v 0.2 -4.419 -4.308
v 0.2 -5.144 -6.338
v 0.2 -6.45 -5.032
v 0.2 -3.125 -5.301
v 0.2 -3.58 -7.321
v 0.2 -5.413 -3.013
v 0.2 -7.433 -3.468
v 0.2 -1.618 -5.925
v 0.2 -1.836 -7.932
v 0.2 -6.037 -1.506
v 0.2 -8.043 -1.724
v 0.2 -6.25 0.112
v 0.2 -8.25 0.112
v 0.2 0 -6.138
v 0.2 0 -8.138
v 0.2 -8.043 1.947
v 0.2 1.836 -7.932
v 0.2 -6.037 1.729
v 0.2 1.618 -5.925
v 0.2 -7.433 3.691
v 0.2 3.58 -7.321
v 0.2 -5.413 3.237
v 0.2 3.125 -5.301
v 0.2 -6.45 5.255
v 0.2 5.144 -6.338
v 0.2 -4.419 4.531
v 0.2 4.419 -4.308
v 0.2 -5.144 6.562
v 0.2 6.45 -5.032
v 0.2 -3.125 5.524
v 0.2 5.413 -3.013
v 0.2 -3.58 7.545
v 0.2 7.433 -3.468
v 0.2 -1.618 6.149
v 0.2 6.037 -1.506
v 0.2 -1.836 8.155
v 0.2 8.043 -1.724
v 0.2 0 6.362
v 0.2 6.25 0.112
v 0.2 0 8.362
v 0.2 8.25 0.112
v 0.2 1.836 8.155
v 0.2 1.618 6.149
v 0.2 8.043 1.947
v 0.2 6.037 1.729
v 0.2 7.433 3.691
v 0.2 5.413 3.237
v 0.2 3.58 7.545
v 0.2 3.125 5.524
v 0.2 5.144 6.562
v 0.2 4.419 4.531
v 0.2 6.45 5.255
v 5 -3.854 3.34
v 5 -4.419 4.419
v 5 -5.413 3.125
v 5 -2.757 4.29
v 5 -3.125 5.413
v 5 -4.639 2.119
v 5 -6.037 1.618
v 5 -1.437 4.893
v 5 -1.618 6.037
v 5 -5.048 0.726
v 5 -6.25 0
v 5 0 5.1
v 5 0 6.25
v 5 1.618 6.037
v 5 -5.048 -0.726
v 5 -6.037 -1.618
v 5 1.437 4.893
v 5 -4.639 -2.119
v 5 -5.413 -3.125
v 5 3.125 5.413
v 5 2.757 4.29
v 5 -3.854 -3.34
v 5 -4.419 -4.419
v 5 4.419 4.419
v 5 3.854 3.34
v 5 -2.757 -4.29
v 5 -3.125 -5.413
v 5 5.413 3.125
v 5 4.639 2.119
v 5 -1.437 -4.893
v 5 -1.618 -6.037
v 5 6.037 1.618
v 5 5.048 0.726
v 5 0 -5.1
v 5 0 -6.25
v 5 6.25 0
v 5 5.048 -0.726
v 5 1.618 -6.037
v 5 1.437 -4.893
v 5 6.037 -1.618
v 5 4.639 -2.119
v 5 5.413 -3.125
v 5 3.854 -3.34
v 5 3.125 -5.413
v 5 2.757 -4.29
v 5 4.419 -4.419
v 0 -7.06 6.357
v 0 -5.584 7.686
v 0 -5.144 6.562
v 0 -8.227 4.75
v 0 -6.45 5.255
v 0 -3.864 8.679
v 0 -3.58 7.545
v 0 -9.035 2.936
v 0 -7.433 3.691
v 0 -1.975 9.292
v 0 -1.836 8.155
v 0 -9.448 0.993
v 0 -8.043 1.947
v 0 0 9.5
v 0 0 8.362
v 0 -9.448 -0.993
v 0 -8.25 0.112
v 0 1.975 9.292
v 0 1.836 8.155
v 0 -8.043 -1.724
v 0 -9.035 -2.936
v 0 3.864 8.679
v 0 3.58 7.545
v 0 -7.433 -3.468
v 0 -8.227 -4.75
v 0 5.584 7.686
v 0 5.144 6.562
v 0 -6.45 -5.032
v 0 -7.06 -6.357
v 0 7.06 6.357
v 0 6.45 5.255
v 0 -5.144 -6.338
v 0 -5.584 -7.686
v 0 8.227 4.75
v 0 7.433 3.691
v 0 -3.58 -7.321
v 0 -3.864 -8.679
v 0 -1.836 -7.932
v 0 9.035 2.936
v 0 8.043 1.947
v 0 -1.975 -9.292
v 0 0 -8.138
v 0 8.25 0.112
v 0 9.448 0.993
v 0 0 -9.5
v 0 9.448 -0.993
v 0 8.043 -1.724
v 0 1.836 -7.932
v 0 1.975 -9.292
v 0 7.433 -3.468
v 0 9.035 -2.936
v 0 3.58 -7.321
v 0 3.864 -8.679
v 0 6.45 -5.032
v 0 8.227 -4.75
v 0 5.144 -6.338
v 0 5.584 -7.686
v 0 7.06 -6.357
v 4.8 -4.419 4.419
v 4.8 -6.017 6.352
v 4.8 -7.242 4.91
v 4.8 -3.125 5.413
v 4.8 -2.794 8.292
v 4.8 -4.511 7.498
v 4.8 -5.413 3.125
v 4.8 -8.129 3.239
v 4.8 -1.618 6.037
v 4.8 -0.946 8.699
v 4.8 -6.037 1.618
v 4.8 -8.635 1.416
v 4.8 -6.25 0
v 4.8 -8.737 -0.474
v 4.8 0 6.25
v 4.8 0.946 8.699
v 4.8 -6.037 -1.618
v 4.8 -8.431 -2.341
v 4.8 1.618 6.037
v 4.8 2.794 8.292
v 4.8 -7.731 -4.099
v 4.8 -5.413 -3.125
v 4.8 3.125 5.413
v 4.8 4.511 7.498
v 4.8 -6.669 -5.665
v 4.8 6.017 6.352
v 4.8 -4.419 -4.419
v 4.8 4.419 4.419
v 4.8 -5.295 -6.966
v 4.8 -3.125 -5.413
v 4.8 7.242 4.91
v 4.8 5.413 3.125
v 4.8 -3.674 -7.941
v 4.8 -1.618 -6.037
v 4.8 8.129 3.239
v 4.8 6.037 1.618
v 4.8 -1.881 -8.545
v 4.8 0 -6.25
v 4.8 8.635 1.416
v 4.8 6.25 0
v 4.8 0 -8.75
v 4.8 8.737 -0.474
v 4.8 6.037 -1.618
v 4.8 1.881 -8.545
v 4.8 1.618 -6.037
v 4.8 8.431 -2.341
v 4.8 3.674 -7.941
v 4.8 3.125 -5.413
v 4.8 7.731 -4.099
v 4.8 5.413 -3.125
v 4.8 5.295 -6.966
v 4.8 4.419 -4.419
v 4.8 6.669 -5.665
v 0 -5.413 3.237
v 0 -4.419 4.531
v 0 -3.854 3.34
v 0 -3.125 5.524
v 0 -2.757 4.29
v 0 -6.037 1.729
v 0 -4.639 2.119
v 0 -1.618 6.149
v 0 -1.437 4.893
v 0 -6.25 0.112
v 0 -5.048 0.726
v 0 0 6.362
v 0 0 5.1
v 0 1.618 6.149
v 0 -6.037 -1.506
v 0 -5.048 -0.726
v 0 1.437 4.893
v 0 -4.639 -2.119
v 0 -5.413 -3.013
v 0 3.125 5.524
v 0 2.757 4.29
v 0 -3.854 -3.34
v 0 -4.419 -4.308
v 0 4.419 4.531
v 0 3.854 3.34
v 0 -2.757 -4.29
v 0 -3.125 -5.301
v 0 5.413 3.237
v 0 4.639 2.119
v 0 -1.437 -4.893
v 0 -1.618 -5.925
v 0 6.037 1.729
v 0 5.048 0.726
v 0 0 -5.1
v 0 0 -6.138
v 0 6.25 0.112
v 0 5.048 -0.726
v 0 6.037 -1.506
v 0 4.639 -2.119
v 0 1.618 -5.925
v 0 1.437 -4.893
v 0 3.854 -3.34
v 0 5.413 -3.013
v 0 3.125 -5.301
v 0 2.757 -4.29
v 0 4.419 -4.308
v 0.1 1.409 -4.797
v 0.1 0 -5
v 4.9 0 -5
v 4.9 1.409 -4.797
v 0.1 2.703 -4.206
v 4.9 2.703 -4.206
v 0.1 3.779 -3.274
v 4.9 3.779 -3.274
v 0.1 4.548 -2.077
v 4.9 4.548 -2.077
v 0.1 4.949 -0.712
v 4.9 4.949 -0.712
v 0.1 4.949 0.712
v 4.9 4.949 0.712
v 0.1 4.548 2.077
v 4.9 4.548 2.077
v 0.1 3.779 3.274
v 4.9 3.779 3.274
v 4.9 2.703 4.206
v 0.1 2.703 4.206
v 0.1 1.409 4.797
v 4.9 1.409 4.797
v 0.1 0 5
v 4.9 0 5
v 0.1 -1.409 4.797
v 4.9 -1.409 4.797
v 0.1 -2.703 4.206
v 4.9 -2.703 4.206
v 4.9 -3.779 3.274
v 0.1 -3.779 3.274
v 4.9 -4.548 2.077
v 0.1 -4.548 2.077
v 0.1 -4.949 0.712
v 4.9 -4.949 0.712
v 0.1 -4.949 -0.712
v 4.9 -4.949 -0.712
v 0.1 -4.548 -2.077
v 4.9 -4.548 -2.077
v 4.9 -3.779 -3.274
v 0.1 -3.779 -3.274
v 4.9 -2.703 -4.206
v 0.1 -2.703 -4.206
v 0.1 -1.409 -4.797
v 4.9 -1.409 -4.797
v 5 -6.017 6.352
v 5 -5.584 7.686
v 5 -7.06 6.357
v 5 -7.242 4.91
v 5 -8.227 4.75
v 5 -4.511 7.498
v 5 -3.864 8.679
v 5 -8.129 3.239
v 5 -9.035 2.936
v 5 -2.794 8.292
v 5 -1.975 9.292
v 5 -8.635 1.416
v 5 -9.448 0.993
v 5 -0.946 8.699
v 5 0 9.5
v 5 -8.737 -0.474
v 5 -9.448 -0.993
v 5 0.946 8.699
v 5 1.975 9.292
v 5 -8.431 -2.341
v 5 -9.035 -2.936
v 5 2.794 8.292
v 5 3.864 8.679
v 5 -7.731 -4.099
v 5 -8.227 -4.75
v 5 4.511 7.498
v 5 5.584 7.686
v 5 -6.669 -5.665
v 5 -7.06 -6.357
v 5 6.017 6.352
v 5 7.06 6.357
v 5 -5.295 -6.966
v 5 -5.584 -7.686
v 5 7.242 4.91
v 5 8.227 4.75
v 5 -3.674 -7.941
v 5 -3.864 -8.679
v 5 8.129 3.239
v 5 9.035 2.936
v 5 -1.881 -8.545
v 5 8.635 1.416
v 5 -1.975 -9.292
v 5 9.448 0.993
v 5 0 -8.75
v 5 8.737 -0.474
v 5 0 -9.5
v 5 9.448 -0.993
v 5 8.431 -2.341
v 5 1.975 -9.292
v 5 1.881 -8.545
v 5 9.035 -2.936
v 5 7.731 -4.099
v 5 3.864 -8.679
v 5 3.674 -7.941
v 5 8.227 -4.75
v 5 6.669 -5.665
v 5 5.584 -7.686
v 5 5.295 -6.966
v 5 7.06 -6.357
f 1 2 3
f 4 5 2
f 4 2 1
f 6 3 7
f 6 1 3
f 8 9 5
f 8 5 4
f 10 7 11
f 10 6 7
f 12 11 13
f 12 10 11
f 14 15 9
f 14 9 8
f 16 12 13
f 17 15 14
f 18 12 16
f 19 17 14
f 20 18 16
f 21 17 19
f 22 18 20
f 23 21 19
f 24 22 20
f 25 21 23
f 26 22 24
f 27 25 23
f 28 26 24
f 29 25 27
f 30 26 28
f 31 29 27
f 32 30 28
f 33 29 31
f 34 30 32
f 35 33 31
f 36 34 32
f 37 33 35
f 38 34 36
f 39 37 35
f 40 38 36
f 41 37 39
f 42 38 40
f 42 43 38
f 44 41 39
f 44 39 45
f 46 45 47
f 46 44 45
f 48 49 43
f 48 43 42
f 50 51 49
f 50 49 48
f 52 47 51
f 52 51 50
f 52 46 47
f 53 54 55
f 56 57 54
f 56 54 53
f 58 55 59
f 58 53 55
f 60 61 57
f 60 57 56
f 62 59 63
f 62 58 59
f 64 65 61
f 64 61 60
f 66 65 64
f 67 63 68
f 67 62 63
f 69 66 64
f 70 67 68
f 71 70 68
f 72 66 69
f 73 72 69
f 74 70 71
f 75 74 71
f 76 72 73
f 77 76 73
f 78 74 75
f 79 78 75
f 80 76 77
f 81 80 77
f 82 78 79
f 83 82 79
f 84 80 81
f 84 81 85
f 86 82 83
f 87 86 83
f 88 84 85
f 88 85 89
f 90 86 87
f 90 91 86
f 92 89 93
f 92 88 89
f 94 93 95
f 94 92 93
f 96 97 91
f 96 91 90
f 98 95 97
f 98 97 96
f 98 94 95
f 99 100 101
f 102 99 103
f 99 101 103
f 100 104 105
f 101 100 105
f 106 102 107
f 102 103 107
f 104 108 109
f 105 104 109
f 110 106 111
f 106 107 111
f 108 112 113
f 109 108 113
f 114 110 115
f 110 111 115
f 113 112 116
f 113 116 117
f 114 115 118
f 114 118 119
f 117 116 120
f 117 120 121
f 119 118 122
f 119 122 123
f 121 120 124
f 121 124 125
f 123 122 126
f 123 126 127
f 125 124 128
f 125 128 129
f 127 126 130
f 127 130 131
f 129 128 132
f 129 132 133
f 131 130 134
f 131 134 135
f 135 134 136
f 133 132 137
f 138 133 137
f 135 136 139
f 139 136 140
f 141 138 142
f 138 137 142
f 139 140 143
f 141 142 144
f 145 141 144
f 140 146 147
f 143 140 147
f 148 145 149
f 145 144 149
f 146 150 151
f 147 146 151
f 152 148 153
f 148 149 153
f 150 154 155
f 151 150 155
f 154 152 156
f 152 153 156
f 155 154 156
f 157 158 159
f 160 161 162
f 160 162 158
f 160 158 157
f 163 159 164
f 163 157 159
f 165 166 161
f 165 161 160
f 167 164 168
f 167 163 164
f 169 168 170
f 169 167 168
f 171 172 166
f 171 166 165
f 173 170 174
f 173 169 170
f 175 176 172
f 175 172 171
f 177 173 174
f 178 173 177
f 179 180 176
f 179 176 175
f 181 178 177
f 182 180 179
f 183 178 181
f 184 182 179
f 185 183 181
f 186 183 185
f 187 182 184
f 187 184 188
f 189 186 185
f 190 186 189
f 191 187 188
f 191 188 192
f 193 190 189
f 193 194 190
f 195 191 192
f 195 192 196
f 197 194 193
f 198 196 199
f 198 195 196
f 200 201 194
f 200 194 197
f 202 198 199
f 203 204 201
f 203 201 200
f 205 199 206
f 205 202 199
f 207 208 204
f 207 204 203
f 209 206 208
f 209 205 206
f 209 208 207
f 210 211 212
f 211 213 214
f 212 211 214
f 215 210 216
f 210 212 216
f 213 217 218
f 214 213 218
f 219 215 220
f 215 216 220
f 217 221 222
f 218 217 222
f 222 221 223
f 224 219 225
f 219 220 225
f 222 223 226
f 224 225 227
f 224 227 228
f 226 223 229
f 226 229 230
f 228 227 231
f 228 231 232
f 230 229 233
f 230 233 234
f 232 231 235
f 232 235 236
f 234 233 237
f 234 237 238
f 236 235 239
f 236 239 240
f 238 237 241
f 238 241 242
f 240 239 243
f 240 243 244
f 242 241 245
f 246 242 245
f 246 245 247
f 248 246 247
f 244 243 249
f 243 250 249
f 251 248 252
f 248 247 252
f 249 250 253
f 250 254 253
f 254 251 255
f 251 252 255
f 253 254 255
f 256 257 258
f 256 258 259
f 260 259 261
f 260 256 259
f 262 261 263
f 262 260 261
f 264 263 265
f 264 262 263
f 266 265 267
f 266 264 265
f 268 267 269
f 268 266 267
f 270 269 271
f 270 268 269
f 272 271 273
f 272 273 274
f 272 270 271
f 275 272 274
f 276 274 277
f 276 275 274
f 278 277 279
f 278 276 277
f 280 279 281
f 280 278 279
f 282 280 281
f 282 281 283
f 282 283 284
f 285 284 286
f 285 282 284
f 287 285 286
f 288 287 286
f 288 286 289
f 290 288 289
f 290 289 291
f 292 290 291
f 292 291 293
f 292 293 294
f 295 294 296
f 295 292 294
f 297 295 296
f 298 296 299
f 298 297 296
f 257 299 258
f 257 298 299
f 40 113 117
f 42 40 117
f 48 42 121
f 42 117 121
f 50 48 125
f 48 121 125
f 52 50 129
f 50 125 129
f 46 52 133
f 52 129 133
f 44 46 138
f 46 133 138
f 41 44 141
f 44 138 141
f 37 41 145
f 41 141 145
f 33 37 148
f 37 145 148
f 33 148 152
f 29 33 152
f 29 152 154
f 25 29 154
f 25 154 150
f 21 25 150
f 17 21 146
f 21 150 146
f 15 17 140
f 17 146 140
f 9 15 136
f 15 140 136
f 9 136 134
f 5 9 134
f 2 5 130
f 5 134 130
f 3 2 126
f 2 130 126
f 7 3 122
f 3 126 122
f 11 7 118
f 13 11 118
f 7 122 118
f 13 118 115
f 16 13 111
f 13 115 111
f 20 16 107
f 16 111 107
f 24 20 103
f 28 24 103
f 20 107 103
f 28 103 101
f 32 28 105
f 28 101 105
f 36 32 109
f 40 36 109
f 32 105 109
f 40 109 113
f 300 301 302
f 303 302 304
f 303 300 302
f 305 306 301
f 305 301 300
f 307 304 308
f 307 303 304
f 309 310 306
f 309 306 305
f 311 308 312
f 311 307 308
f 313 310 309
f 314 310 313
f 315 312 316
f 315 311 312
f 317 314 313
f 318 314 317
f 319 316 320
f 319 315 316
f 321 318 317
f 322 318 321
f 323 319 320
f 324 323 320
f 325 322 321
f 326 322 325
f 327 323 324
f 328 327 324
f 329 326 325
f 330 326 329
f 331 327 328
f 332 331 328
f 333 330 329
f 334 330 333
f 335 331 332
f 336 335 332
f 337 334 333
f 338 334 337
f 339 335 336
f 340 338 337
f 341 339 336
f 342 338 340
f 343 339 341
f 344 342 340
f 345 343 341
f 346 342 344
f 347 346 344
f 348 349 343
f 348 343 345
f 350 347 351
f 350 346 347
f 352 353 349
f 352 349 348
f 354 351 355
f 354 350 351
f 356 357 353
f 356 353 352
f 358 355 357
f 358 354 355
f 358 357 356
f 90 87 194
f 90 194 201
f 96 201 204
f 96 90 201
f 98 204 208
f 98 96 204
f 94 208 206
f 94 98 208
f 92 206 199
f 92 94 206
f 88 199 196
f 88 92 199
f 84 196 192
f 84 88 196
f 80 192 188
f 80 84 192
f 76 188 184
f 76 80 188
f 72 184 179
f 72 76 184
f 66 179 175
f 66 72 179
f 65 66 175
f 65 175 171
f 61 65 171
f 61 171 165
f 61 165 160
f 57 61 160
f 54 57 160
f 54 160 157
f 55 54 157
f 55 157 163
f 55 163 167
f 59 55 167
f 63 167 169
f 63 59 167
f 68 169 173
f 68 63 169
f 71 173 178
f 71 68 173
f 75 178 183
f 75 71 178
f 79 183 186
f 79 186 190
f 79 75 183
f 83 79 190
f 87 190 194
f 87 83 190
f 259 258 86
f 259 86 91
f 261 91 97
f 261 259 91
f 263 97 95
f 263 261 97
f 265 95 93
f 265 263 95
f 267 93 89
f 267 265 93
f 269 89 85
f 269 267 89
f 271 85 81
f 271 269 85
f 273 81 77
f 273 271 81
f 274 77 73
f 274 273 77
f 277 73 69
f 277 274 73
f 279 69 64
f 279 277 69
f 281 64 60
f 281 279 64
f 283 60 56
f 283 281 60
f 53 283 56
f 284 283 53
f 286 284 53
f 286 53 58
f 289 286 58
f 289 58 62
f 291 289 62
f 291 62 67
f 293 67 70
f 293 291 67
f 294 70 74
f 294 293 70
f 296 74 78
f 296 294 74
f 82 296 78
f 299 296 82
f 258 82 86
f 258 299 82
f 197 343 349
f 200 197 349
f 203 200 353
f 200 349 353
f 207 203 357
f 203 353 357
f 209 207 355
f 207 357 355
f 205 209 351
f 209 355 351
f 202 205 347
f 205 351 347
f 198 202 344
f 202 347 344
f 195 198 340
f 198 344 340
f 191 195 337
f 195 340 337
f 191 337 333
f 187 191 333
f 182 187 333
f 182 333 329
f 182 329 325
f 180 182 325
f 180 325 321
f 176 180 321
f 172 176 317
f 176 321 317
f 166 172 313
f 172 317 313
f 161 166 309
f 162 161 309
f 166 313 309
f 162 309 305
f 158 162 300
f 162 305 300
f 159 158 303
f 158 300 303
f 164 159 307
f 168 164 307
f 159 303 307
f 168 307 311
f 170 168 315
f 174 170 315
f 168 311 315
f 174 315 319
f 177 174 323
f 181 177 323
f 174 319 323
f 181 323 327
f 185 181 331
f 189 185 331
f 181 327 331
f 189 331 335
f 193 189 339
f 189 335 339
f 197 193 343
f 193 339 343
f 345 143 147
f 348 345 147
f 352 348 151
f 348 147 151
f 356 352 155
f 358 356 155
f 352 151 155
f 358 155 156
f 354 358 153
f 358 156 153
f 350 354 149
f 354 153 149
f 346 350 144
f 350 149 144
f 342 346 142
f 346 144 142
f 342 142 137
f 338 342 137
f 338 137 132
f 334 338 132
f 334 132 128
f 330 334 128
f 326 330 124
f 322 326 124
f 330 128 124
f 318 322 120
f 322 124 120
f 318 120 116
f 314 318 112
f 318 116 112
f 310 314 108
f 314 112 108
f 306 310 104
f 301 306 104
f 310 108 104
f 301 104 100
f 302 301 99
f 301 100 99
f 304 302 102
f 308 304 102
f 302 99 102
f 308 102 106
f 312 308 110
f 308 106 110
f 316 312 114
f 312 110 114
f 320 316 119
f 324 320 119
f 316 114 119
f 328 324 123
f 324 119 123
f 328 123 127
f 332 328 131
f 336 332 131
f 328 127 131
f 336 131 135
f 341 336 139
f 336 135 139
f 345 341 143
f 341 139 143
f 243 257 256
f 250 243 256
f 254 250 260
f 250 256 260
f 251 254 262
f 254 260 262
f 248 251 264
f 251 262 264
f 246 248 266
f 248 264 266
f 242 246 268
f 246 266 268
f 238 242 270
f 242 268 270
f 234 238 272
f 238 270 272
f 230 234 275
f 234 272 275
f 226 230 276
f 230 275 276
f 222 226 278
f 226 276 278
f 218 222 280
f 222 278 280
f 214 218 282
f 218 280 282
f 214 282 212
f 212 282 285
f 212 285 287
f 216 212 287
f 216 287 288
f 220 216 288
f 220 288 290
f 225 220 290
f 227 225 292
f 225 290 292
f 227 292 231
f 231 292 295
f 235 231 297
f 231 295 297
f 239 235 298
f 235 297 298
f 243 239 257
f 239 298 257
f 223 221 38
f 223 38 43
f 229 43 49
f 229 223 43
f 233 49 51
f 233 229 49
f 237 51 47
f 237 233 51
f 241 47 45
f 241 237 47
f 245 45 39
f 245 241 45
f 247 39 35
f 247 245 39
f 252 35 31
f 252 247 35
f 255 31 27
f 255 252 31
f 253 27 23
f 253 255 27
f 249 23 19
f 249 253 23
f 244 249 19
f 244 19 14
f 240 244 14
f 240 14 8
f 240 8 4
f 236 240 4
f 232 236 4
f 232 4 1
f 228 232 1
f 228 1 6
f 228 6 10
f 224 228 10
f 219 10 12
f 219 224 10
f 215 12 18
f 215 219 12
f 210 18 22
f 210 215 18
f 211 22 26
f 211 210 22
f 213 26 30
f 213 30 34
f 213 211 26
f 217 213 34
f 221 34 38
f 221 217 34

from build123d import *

# Parameters (mm, degrees)
SKETCH_1_R          = 9.5
SKETCH_1_R_2        = 5
EXTRUDE_1_DEPTH     = 5
SKETCH_2_R          = 8.25
SKETCH_2_R_2        = 6.25
CUT_EXTRUDE_1_DEPTH = 0.2
SKETCH_3_R          = 8.75
SKETCH_3_R_2        = 6.25
CUT_EXTRUDE_2_DEPTH = 0.2
CHAMFER_2_SIZE      = 0.1


with BuildPart() as part:
    # 草图1 → 凸台-拉伸1 (new body)
    with BuildSketch(Plane(origin=(0, 0, 0), x_dir=(0, 0, -1), z_dir=(1, 0, 0))):
        Circle(SKETCH_1_R)
        Circle(SKETCH_1_R_2, mode=Mode.SUBTRACT)
    extrude(amount=EXTRUDE_1_DEPTH)

    # 草图2 → 切除-拉伸1 (cut)
    with BuildSketch(Plane.ZY):
        with Locations((0.111641095, 0)):
            Circle(SKETCH_2_R)
        with Locations((0.111641095, 0)):
            Circle(SKETCH_2_R_2, mode=Mode.SUBTRACT)
    extrude(amount=-CUT_EXTRUDE_1_DEPTH, mode=Mode.SUBTRACT)

    # 草图3 → 切除-拉伸2 (cut)
    with BuildSketch(Plane(origin=(5, 0, 0), x_dir=(0, 0, -1), z_dir=(1, 0, 0))):
        Circle(SKETCH_3_R)
        Circle(SKETCH_3_R_2, mode=Mode.SUBTRACT)
    extrude(amount=-CUT_EXTRUDE_2_DEPTH, mode=Mode.SUBTRACT)

    # 倒角2
    chamfer_2_edges = [part.edges().sort_by_distance(p)[0] for p in [
        (0, 0, 5),
        (5, 0, 5),
    ]]
    chamfer(chamfer_2_edges, length=CHAMFER_2_SIZE)


solid = part.part
